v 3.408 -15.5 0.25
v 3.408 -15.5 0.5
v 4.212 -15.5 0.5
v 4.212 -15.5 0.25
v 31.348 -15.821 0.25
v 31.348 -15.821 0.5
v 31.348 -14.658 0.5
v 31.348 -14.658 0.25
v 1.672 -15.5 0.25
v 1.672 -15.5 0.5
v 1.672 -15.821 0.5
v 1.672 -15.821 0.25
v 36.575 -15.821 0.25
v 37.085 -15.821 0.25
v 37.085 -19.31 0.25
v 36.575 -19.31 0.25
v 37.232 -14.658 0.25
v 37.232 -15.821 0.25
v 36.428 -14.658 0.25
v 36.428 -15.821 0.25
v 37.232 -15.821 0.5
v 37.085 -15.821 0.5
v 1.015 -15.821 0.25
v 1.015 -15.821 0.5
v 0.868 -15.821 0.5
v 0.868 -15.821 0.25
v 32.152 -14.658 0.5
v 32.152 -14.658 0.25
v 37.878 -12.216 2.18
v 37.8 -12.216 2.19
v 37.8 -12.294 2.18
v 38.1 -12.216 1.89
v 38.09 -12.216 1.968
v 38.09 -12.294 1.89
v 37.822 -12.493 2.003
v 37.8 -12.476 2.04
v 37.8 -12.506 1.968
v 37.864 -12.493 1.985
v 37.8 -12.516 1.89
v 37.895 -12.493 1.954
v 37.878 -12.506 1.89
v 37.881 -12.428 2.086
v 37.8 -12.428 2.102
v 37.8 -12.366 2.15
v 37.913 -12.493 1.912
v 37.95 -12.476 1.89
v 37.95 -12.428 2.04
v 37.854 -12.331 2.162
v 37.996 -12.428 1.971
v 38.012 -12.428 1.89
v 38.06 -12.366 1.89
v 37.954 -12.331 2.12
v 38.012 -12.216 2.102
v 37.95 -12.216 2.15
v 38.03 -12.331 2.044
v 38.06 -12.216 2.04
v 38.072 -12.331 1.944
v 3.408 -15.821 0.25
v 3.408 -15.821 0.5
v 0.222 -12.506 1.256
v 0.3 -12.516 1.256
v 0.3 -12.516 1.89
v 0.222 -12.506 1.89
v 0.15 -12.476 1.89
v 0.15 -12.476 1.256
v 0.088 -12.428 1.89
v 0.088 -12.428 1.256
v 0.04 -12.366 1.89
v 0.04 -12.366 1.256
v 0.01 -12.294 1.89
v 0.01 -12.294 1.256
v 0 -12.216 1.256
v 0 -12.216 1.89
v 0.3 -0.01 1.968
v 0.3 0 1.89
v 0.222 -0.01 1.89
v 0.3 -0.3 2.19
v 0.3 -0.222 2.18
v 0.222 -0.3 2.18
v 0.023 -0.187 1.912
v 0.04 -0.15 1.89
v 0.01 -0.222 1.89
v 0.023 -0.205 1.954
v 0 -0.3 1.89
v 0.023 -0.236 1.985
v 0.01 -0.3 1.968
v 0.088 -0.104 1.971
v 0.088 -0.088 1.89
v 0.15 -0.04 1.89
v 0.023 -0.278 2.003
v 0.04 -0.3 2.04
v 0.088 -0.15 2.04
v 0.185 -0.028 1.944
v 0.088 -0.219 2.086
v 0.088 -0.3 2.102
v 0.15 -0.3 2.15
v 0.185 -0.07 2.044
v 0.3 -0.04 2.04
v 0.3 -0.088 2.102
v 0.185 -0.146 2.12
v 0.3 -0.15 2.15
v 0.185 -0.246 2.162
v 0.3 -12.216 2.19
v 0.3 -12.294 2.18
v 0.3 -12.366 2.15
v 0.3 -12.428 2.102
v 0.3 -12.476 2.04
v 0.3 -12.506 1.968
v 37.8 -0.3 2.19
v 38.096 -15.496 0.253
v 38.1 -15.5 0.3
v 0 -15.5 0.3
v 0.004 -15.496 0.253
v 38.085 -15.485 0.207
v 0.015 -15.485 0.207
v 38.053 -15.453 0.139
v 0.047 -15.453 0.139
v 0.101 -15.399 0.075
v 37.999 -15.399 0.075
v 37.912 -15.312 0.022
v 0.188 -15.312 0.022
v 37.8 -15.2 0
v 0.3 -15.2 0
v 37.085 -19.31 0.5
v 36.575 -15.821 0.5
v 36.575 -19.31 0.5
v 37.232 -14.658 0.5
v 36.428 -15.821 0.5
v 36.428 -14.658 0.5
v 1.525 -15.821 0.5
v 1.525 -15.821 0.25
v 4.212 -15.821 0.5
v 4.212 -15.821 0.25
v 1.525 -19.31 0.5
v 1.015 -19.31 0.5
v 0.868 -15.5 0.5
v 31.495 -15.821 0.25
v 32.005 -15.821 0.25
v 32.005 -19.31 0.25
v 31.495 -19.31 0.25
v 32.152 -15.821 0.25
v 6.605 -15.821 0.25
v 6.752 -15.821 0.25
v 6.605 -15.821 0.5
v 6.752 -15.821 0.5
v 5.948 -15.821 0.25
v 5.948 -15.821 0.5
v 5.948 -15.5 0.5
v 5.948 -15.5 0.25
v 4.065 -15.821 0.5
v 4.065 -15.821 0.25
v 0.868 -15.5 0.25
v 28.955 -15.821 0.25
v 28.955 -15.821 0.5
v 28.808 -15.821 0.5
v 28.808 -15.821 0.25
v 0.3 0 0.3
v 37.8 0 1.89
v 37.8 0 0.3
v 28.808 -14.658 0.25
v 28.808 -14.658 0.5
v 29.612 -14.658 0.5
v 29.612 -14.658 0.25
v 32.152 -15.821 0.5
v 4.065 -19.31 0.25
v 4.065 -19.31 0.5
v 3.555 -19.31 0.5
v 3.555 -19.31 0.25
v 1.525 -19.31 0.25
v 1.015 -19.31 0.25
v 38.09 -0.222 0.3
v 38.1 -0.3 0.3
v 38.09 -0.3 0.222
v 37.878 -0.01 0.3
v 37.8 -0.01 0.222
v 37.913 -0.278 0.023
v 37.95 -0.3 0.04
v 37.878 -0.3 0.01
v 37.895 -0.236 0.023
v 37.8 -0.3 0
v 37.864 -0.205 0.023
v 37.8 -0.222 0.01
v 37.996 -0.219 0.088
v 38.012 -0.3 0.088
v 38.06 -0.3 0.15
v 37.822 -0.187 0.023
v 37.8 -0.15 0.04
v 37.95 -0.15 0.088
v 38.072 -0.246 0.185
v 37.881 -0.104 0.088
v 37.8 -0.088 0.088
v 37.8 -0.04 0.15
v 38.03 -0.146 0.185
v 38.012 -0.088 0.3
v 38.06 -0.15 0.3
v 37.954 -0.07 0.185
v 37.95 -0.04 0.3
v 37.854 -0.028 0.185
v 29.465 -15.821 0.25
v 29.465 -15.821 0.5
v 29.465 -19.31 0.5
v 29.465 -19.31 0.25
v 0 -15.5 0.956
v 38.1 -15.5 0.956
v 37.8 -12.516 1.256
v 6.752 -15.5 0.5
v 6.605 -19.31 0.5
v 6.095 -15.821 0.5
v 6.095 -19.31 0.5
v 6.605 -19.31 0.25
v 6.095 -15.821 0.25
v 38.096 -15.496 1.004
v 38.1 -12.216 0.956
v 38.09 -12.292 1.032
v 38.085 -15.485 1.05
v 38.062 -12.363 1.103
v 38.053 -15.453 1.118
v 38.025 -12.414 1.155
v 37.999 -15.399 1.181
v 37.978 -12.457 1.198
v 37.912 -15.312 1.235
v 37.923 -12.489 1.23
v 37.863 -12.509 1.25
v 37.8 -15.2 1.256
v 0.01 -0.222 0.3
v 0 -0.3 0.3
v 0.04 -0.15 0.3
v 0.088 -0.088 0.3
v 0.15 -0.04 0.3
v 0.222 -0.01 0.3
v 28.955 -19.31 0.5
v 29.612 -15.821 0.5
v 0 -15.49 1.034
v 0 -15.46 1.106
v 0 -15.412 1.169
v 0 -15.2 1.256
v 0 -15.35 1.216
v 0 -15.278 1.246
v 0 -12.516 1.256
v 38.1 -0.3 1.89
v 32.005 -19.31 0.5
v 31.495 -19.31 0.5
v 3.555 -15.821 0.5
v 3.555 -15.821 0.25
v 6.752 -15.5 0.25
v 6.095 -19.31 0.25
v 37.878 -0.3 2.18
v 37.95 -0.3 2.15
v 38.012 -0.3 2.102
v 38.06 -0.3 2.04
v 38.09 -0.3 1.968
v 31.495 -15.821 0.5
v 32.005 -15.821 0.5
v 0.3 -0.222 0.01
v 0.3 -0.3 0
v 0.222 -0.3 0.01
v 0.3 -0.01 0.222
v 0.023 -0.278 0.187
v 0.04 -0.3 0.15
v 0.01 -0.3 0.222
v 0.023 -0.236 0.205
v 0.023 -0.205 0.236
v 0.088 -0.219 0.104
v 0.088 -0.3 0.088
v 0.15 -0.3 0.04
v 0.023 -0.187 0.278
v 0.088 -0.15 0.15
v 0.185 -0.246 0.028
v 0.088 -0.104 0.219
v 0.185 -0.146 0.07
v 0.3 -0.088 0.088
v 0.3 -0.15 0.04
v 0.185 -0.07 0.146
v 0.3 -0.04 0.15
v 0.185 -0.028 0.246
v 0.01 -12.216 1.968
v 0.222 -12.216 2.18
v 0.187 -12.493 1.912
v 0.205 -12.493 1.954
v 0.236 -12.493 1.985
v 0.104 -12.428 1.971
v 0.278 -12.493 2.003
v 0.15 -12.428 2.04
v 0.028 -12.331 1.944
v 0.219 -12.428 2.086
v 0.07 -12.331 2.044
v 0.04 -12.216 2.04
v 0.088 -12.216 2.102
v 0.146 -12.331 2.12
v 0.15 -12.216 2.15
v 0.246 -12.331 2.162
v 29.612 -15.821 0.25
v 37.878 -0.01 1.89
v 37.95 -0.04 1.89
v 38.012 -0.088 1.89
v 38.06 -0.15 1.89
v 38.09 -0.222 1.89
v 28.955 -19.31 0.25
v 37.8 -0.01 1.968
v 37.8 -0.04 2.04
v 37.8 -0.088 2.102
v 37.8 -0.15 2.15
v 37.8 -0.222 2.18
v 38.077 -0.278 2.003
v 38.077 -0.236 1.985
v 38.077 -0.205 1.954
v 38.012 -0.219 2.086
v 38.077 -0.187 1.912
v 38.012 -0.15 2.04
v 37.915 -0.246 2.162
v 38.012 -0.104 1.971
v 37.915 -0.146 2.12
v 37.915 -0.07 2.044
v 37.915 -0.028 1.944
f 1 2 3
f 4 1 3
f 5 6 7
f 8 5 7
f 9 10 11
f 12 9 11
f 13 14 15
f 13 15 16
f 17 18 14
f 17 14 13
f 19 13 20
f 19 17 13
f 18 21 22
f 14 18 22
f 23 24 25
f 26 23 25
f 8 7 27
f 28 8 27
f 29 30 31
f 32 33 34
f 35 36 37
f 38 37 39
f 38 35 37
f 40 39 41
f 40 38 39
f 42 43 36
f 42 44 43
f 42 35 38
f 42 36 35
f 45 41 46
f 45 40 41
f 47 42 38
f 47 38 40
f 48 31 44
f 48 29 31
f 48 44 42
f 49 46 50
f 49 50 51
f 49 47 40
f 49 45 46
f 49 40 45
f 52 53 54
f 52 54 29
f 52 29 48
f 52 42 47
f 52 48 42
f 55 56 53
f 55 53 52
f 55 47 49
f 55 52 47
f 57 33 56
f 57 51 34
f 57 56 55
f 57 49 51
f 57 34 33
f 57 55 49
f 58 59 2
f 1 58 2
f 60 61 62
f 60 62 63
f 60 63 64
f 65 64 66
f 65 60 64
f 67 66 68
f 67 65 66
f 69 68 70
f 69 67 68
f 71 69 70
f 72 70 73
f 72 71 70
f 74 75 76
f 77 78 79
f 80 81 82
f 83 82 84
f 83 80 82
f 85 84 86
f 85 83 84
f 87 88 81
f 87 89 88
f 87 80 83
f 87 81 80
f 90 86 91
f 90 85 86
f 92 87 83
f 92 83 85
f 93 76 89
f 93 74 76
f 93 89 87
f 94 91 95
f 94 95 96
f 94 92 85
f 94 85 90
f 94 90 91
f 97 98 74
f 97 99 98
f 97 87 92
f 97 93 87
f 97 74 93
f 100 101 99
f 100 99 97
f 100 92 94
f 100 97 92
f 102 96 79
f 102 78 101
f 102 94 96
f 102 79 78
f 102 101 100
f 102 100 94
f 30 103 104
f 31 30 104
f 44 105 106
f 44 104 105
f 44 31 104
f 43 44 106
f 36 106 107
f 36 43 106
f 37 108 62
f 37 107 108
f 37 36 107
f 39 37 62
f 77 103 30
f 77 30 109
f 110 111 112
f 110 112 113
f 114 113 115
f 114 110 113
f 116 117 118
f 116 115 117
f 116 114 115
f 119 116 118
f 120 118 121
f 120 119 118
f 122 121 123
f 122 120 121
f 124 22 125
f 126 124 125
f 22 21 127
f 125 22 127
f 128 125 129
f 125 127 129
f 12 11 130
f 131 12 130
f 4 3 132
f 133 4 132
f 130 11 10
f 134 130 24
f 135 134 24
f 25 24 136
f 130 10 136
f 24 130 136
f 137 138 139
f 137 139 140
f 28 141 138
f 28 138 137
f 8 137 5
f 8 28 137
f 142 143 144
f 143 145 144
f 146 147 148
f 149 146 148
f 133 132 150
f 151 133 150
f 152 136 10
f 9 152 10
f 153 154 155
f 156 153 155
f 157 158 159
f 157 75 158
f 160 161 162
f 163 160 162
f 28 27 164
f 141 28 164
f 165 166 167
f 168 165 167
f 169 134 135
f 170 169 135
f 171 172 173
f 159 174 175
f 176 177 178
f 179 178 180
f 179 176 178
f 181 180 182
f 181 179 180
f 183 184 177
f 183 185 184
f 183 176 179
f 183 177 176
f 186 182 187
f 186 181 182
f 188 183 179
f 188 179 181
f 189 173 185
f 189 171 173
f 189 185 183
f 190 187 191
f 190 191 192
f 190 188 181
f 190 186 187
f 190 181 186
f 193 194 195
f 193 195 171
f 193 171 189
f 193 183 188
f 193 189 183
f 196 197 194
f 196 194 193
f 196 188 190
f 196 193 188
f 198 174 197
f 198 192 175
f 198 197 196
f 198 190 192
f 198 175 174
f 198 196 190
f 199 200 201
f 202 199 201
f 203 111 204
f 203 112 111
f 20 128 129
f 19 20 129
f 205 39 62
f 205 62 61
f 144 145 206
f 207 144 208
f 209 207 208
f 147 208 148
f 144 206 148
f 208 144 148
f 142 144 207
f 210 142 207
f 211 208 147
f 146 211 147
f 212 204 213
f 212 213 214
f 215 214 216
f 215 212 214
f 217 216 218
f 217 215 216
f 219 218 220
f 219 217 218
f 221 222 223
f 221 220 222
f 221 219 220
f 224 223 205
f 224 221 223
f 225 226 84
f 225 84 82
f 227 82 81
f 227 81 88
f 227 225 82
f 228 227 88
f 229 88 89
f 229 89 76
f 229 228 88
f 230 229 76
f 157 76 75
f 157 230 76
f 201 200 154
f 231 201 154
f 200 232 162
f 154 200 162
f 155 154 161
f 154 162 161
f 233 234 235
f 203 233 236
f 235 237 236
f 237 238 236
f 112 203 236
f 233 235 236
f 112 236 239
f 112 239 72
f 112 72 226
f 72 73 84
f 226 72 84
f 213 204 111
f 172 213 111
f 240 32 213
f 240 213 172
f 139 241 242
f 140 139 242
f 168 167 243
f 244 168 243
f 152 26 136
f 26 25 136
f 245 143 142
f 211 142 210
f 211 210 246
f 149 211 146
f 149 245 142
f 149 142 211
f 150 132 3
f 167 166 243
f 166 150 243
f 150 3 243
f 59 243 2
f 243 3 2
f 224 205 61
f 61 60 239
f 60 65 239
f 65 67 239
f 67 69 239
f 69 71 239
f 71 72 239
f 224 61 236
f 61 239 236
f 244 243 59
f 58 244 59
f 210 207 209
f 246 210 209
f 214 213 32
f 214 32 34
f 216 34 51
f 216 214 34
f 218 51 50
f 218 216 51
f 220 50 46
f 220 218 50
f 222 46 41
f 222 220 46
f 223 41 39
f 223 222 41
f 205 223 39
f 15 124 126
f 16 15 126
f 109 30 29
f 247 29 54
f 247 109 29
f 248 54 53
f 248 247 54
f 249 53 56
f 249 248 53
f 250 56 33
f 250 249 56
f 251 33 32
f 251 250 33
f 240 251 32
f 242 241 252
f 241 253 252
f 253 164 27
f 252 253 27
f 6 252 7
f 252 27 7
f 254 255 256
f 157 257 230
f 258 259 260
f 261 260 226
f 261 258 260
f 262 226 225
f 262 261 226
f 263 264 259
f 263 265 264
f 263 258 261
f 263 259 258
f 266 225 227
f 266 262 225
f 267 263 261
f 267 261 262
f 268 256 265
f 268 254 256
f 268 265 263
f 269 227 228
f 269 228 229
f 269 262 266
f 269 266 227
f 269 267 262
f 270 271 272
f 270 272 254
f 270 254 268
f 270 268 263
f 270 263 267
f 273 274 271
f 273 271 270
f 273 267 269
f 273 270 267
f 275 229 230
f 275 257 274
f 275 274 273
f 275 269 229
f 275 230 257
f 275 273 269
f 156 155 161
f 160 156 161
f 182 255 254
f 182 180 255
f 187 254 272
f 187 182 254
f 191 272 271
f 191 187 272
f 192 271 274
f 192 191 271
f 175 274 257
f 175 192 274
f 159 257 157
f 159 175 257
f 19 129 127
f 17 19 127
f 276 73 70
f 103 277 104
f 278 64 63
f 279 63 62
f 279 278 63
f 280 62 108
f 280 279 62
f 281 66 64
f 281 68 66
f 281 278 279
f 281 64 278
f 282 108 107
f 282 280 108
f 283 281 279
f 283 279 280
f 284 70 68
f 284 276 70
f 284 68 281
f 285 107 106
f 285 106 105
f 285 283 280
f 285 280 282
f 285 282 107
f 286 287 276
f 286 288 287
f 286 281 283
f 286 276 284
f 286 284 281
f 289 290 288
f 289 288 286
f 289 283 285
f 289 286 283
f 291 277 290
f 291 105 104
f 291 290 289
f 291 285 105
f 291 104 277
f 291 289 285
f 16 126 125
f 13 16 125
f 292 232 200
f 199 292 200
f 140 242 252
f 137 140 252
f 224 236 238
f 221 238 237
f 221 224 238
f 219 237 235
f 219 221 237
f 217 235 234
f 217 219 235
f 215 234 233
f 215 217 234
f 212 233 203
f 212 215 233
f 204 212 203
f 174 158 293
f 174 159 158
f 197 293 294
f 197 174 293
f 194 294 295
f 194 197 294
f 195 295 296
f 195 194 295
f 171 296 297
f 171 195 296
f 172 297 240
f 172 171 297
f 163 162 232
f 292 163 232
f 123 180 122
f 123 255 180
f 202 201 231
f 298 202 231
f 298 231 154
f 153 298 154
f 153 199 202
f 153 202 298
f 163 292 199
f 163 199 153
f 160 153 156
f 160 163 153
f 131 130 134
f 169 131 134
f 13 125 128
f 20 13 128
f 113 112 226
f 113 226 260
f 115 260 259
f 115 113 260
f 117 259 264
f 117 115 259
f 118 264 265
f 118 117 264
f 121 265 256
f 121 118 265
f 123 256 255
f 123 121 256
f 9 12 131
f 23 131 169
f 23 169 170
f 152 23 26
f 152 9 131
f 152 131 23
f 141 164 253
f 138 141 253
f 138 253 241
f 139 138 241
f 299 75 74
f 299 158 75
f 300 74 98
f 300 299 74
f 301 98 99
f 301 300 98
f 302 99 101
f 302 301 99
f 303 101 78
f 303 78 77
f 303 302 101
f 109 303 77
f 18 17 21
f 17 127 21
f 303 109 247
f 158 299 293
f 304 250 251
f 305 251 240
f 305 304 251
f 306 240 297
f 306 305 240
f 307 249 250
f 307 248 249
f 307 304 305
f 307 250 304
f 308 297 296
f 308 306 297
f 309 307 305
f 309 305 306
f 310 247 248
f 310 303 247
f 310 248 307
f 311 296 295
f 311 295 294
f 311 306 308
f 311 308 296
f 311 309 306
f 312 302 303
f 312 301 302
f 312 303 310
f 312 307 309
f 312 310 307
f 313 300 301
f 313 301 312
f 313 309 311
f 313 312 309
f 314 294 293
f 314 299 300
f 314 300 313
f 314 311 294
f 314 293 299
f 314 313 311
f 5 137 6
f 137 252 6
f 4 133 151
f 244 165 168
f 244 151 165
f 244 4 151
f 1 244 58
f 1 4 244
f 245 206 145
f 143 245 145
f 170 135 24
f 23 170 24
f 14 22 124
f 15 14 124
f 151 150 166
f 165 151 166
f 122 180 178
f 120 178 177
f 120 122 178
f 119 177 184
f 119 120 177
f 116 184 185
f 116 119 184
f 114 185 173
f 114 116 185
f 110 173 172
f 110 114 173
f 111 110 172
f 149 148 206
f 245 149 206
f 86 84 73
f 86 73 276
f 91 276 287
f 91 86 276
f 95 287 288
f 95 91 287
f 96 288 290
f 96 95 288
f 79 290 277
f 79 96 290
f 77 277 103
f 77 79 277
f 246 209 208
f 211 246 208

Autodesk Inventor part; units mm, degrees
ref_plane "YZ Plane" through (0, 0, 0) normal (1, 0, 0) x (0, 1, 0)
ref_plane "XZ Plane" through (0, 0, 0) normal (0, 1, 0) x (-1, 0, 0)
sketch "Sketch2" plane through (0, 0, 0) normal (1, 0, 0) x (0, 1, 0)
  line L0 (0, 0) -> (-15.5, 0)
  line L1 (-15.5, 0) -> (-15.5, 2.19)
  line L2 (-15.5, 2.19) -> (0, 2.19)
  line L3 (0, 2.19) -> (0, 0)
  line L4 (23.9967, 114.2131) -> (23.9967, -36.4561) construction
  line L5 (23.9967, -36.4561) -> (-43.3153, -36.4561) construction
  line L6 (-43.3153, -36.4561) -> (-43.3153, 114.2131) construction
  line L7 (-43.3153, 114.2131) -> (23.9967, 114.2131) construction
  line L8 (-15.5, 2.19) -> (-12.516, 2.19)
  line L9 (-12.516, 2.19) -> (-12.516, 1.2565)
  line L10 (-12.516, 1.2565) -> (-15.5, 1.2565)
  line L11 (-15.5, 1.2565) -> (-15.5, 2.19)
  dimension "d7" = 15.5
  dimension "d8" = 2.19
extrude "Extrusion1" add sketch "Sketch2" along normal blind 38.1 contours L0 L1 L10 L9 L2 L3
ref_plane "Work Plane1" through (0, -15.5, 0.5) normal (0, 0, -1) x (-1, 0, 0)
sketch "Sketch5" plane through (0, -15.5, 0.5) normal (0, 0, -1) x (-1, 0, 0)
  line L0 (-36.1887, 45.1667) -> (-36.1887, -19.1426) construction
  line L1 (-180.1369, -19.1426) -> (-180.1369, 45.1667) construction
  line L2 (-36.1887, -19.1426) -> (-180.1369, -19.1426) construction
  line L3 (-180.1369, 45.1667) -> (-36.1887, 45.1667) construction
  line L4 (-0.8682, 0.8425) -> (-1.6718, 0.8425)
  line L5 (-1.6718, 0.8425) -> (-1.6718, -0.3212)
  line L6 (-0.8682, -0.3212) -> (-0.8682, 0.8425)
  line L7 (-1.525, -0.3212) -> (-1.525, -3.81)
  line L8 (-1.525, -3.81) -> (-1.015, -3.81)
  line L9 (-1.015, -3.81) -> (-1.015, -0.3212)
  line L10 (0, 0) -> (-38.1, 0)
  line L11 (-3.4082, 0.8425) -> (-4.2118, 0.8425)
  line L12 (-4.2118, 0.8425) -> (-4.2118, -0.3212)
  line L13 (-3.4082, -0.3212) -> (-3.4082, 0.8425)
  line L14 (-3.555, -3.81) -> (-3.555, -0.3212)
  line L15 (-4.065, -0.3212) -> (-4.065, -3.81)
  line L16 (-4.065, -3.81) -> (-3.555, -3.81)
  line L17 (-5.9482, 0.8425) -> (-6.7518, 0.8425)
  line L18 (-6.7518, 0.8425) -> (-6.7518, -0.3212)
  line L19 (-5.9482, -0.3212) -> (-5.9482, 0.8425)
  line L20 (-6.095, -3.81) -> (-6.095, -0.3212)
  line L21 (-6.605, -0.3212) -> (-6.605, -3.81)
  line L22 (-6.605, -3.81) -> (-6.095, -3.81)
  line L23 (-28.8082, 0.8425) -> (-29.6118, 0.8425)
  line L24 (-28.8082, -0.3212) -> (-28.8082, 0.8425)
  line L25 (-29.6118, 0.8425) -> (-29.6118, -0.3212)
  line L26 (-29.465, -0.3212) -> (-29.465, -3.81)
  line L27 (-28.955, -3.81) -> (-28.955, -0.3212)
  line L28 (-29.465, -3.81) -> (-28.955, -3.81)
  line L29 (-31.3482, 0.8425) -> (-32.1518, 0.8425)
  line L30 (-31.3482, -0.3212) -> (-31.3482, 0.8425)
  line L31 (-32.1518, 0.8425) -> (-32.1518, -0.3212)
  line L32 (-32.005, -0.3212) -> (-32.005, -3.81)
  line L33 (-31.495, -3.81) -> (-31.495, -0.3212)
  line L34 (-32.005, -3.81) -> (-31.495, -3.81)
  line L35 (-36.4282, 0.8425) -> (-37.2318, 0.8425)
  line L36 (-36.4282, -0.3212) -> (-36.4282, 0.8425)
  line L37 (-37.2318, 0.8425) -> (-37.2318, -0.3212)
  line L38 (-37.085, -0.3212) -> (-37.085, -3.81)
  line L39 (-36.575, -3.81) -> (-36.575, -0.3212)
  line L40 (-37.085, -3.81) -> (-36.575, -3.81)
  line L41 (-37.2318, -0.3212) -> (-37.085, -0.3212)
  line L42 (-36.575, -0.3212) -> (-36.4282, -0.3212)
  line L43 (-32.1518, -0.3212) -> (-32.005, -0.3212)
  line L44 (-31.495, -0.3212) -> (-31.3482, -0.3212)
  line L45 (-29.6118, -0.3212) -> (-29.465, -0.3212)
  line L46 (-28.955, -0.3212) -> (-28.8082, -0.3212)
  line L47 (-6.7518, -0.3212) -> (-6.605, -0.3212)
  line L48 (-6.095, -0.3212) -> (-5.9482, -0.3212)
  line L49 (-4.2118, -0.3212) -> (-4.065, -0.3212)
  line L50 (-3.555, -0.3212) -> (-3.4082, -0.3212)
  line L51 (-1.6718, -0.3212) -> (-1.525, -0.3212)
  line L52 (-1.015, -0.3212) -> (-0.8682, -0.3212)
  point P0 (0, 15.5)
  point P1 (0, 15.5)
  point P2 (-1.27, -0.3212)
  point P3 (-1.27, -3.81)
  point P4 (-3.81, -3.81)
  point P5 (-6.35, -3.81)
  point P6 (-29.21, -3.81)
  point P7 (-31.75, -3.81)
  point P8 (-36.83, -3.81)
  point P9 (-3.4082, 0)
  point P10 (-4.2118, 0)
  point P11 (-5.9482, 0)
  point P12 (-6.7518, 0)
  point P13 (-0.8682, 0)
  point P14 (-1.6718, 0)
  dimension "d141" = 3.81
  dimension "d142" = 0.51
  dimension "d143" = 1.27
  dimension "d144" = 2.54
  dimension "d145" = 2.54
  dimension "d146" = 0.51
  dimension "d147" = 0.51
  dimension "d148" = 22.86
  dimension "d149" = 2.54
  dimension "d150" = 5.08
  dimension "d151" = 0.51
  dimension "d152" = 0.51
  dimension "d153" = 0.51
extrude "Extrusion2" add sketch "Sketch5" along normal blind 0.25 separate body contours L36 L42 L39 L40 L38 L41 L37 L10 | L10 L37 L35 L36 | L30 L44 L33 L34 L32 L43 L31 L10 | L10 L31 L29 L30 | L24 L46 L27 L28 L26 L45 L25 L10 | L10 L25 L23 L24 | L19 L48 L20 L22 L21 L47 L18 L10 | L13 L50 L14 L16 L15 L49 L12 L10 | L6 L52 L9 L8 L7 L51 L5 L10
fillet "Fillet1" radius 0.3 14 edges at (19.05, 0, 2.19) (38.1, -6.258, 2.19) (38.1, 0, 1.095) (19.05, 0, 0) (38.1, -7.75, 0) (0, 0, 1.095) (0, -7.75, 0) (0, -6.258, 2.19) (38.1, -14.008, 1.2565) (38.1, -12.516, 1.7233) (0, -12.516, 1.7233) (19.05, -12.516, 2.19) (19.05, -15.5, 1.2565) (19.05, -15.5, 0)
sketch "Sketch6" plane through (0.3, -12.216, 2.19) normal (0, 0, 1) x (1, 0, 0)
  line L0 (12.6469, 11.0633) -> (25.8407, 11.0633) construction
  line L1 (25.8407, 11.0633) -> (25.8407, 5.9657) construction
  line L2 (25.8407, 5.9657) -> (12.6469, 5.9657) construction
  line L3 (12.6469, 5.9657) -> (12.6469, 11.0633) construction
  point P0 (-0.3, 12.216)
decal "Decal1"
properties part number "CADDOCK - HDV5 - xxxx"
